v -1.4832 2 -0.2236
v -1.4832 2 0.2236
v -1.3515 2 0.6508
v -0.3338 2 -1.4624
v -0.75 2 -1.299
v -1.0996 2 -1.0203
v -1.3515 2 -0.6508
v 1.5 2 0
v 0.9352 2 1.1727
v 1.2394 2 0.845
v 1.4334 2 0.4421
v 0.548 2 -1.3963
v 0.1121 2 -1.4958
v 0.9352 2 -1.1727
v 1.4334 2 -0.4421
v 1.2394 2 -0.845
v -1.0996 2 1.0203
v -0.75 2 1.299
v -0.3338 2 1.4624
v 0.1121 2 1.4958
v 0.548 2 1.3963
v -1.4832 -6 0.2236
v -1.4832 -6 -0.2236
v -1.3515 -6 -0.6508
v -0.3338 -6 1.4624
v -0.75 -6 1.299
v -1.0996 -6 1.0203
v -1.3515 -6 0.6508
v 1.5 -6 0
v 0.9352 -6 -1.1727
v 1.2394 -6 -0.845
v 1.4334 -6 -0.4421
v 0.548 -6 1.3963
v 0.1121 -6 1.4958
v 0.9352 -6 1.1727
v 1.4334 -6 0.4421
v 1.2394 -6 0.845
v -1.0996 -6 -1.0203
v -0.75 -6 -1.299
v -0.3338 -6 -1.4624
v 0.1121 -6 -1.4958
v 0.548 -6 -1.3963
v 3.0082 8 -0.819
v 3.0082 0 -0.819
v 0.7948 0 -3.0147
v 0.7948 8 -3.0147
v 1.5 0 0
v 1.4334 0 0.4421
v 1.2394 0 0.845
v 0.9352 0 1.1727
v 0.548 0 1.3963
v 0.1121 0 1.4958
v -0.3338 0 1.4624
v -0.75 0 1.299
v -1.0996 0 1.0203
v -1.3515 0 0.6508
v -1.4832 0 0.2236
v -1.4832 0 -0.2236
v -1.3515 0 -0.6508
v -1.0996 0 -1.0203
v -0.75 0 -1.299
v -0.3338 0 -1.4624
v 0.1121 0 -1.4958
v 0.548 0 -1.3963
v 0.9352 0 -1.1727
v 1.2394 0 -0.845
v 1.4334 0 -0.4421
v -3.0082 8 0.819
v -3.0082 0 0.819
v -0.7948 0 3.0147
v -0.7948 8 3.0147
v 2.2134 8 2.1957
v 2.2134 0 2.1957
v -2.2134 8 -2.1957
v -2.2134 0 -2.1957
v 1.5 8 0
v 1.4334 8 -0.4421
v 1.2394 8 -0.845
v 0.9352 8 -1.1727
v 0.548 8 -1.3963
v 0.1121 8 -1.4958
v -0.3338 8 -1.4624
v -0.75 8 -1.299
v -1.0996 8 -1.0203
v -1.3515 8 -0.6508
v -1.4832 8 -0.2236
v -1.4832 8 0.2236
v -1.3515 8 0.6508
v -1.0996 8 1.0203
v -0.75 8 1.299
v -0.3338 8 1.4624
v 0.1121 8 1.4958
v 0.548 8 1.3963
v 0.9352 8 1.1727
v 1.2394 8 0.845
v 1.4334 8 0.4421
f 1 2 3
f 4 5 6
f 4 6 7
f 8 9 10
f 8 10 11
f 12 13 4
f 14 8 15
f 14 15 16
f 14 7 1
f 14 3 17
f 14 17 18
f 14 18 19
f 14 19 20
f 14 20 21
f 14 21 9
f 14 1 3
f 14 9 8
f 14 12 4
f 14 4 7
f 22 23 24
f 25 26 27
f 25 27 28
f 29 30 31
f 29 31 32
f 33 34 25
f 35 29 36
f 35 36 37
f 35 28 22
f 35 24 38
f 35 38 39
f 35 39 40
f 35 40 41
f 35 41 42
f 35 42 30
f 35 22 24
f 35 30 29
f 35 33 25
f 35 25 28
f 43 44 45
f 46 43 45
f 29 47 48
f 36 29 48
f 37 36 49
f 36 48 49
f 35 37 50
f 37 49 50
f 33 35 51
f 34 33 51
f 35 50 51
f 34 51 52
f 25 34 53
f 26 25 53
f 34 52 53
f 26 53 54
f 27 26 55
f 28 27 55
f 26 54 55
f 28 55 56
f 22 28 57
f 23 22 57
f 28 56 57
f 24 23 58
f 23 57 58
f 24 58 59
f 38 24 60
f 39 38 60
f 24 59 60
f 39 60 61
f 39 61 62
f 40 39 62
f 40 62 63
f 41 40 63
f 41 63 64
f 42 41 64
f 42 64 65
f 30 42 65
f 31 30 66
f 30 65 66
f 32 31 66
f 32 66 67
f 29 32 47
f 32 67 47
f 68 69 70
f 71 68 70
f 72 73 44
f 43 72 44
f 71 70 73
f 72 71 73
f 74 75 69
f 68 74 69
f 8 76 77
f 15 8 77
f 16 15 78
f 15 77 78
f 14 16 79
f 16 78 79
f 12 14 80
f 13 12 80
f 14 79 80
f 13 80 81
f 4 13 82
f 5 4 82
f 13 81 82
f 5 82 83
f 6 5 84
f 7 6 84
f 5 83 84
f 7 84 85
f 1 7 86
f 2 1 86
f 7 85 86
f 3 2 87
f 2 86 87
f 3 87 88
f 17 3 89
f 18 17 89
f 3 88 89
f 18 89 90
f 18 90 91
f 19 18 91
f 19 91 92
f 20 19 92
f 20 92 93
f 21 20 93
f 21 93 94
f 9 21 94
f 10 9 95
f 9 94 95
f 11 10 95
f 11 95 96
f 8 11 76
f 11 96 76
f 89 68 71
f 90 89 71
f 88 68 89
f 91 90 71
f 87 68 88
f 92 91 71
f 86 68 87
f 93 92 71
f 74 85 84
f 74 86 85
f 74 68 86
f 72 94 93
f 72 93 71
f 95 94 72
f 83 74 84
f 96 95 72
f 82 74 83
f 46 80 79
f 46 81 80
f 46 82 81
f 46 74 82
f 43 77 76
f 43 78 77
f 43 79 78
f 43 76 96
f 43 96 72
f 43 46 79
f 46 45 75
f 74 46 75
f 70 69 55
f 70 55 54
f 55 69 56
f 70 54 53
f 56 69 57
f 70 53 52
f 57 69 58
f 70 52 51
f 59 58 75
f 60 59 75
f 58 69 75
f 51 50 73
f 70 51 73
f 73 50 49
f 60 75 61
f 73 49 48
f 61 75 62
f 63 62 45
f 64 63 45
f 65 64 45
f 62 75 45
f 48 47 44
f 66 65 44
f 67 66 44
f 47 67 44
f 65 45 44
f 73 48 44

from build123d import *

# Parameters (mm, degrees)
BOSS_EXTRUDE1_DEPTH = 8
SKETCH2_R           = 1.5
CUT_EXTRUDE1_DEPTH  = 6
SKETCH3_R           = 1.5
BOSS_EXTRUDE2_DEPTH = 6


with BuildPart() as part:
    # Sketch1 → Boss-Extrude1 (new body)
    with BuildSketch(Plane(origin=(0, 0, 0), x_dir=(1, 0, 0), z_dir=(0, 1, 0))):
        Polygon((2.213376496, -2.195669484), (3.0081938, 0.819005532), (0.794817304, 3.014675016), (-2.213376496, 2.195669484), (-3.0081938, -0.819005532), (-0.794817304, -3.014675016), align=None)
    extrude(amount=BOSS_EXTRUDE1_DEPTH)

    # Sketch2 → Cut-Extrude1 (cut)
    with BuildSketch(Plane(origin=(0, 8, 0), x_dir=(1, 0, 0), z_dir=(0, 1, 0))):
        Circle(SKETCH2_R)
    extrude(amount=-CUT_EXTRUDE1_DEPTH, mode=Mode.SUBTRACT)

    # Sketch3 → Boss-Extrude2 (add)
    with BuildSketch(Plane.XZ):
        Circle(SKETCH3_R)
    extrude(amount=BOSS_EXTRUDE2_DEPTH)


solid = part.part
